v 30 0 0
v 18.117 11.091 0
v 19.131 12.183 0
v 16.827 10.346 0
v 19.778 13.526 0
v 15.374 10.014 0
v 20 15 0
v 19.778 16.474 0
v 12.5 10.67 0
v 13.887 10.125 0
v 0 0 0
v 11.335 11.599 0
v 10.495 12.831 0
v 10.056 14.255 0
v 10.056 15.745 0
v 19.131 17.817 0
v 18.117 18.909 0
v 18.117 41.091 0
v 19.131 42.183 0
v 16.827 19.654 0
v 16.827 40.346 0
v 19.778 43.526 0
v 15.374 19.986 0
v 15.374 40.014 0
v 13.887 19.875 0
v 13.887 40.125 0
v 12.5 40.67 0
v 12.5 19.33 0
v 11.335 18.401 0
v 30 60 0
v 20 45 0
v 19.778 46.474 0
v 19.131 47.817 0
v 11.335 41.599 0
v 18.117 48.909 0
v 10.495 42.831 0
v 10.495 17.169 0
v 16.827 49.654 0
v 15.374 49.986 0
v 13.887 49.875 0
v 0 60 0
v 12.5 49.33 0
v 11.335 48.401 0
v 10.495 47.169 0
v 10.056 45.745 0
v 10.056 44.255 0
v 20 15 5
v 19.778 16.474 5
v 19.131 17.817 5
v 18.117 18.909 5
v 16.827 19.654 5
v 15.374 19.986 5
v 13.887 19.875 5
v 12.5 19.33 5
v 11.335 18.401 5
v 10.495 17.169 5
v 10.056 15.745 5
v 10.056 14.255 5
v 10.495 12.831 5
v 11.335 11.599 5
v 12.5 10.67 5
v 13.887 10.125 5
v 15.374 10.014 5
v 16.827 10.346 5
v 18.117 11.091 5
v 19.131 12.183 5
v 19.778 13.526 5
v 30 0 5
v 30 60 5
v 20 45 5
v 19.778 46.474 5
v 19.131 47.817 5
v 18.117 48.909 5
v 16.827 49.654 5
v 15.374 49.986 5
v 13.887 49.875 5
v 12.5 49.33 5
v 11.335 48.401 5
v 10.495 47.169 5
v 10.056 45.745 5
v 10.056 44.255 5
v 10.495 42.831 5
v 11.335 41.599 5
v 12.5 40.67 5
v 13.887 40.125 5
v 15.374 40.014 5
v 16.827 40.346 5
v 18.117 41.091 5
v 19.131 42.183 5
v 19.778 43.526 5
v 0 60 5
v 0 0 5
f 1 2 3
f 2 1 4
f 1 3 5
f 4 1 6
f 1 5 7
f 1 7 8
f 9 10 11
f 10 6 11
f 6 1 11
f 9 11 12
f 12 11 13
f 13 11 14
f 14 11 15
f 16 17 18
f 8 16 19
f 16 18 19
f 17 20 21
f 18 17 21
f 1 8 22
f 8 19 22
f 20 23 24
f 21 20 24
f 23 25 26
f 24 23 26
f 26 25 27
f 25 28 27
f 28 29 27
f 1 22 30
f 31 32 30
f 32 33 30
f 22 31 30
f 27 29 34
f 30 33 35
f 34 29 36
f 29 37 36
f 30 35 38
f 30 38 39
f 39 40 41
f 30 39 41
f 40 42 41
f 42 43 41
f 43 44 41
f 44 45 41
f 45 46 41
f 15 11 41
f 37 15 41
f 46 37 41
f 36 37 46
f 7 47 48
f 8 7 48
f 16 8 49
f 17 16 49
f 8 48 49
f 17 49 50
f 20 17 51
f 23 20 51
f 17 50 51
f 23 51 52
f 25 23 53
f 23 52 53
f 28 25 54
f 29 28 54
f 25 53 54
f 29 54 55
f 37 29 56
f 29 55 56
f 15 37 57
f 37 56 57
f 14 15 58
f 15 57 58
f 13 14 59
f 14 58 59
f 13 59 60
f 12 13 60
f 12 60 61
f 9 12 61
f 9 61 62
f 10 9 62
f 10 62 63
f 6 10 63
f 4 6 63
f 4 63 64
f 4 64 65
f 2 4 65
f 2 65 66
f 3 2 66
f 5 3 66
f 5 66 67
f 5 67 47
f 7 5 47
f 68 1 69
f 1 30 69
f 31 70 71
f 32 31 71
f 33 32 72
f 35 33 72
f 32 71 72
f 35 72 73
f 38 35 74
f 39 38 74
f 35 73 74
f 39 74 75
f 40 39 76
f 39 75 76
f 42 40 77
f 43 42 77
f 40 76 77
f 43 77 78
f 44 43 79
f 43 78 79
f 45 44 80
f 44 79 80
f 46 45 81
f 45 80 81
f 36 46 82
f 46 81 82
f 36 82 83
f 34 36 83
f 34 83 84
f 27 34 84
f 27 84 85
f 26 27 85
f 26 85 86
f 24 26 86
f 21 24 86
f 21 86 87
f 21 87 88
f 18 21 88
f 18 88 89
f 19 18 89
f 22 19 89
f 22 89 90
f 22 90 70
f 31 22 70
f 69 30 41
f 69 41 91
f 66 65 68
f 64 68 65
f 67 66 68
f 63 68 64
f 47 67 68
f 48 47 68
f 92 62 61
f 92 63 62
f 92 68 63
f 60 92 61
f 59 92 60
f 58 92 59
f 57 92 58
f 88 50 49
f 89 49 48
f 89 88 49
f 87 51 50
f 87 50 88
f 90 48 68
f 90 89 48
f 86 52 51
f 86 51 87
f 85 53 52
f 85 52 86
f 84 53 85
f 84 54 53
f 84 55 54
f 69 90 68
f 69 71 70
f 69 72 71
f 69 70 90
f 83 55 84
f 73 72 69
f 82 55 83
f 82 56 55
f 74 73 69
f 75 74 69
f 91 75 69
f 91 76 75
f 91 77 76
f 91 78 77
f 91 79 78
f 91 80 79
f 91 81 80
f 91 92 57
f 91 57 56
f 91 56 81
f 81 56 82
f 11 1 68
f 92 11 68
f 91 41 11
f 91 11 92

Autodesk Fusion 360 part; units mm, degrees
sketch "Esboço3" plane through (0, 0, 0) normal (0, 0, 1) x (1, 0, 0)
box "Primitiva de caixa2" add length 60 width 30 height 5 placed x (0, 1, 0) y (-1, 0, 0) z (0, 0, 1) at (30, 0, 0)
cylinder "Cilindro primitivo2" cut diameter 10 height -35 placed x (1, 0, 0) y (0, 1, 0) z (0, 0, 1) at (15, 15, 5)
cylinder "Cilindro primitivo3" cut diameter 10 height -8 placed x (1, 0, 0) y (0, 1, 0) z (0, 0, 1) at (15, 45, 5)
